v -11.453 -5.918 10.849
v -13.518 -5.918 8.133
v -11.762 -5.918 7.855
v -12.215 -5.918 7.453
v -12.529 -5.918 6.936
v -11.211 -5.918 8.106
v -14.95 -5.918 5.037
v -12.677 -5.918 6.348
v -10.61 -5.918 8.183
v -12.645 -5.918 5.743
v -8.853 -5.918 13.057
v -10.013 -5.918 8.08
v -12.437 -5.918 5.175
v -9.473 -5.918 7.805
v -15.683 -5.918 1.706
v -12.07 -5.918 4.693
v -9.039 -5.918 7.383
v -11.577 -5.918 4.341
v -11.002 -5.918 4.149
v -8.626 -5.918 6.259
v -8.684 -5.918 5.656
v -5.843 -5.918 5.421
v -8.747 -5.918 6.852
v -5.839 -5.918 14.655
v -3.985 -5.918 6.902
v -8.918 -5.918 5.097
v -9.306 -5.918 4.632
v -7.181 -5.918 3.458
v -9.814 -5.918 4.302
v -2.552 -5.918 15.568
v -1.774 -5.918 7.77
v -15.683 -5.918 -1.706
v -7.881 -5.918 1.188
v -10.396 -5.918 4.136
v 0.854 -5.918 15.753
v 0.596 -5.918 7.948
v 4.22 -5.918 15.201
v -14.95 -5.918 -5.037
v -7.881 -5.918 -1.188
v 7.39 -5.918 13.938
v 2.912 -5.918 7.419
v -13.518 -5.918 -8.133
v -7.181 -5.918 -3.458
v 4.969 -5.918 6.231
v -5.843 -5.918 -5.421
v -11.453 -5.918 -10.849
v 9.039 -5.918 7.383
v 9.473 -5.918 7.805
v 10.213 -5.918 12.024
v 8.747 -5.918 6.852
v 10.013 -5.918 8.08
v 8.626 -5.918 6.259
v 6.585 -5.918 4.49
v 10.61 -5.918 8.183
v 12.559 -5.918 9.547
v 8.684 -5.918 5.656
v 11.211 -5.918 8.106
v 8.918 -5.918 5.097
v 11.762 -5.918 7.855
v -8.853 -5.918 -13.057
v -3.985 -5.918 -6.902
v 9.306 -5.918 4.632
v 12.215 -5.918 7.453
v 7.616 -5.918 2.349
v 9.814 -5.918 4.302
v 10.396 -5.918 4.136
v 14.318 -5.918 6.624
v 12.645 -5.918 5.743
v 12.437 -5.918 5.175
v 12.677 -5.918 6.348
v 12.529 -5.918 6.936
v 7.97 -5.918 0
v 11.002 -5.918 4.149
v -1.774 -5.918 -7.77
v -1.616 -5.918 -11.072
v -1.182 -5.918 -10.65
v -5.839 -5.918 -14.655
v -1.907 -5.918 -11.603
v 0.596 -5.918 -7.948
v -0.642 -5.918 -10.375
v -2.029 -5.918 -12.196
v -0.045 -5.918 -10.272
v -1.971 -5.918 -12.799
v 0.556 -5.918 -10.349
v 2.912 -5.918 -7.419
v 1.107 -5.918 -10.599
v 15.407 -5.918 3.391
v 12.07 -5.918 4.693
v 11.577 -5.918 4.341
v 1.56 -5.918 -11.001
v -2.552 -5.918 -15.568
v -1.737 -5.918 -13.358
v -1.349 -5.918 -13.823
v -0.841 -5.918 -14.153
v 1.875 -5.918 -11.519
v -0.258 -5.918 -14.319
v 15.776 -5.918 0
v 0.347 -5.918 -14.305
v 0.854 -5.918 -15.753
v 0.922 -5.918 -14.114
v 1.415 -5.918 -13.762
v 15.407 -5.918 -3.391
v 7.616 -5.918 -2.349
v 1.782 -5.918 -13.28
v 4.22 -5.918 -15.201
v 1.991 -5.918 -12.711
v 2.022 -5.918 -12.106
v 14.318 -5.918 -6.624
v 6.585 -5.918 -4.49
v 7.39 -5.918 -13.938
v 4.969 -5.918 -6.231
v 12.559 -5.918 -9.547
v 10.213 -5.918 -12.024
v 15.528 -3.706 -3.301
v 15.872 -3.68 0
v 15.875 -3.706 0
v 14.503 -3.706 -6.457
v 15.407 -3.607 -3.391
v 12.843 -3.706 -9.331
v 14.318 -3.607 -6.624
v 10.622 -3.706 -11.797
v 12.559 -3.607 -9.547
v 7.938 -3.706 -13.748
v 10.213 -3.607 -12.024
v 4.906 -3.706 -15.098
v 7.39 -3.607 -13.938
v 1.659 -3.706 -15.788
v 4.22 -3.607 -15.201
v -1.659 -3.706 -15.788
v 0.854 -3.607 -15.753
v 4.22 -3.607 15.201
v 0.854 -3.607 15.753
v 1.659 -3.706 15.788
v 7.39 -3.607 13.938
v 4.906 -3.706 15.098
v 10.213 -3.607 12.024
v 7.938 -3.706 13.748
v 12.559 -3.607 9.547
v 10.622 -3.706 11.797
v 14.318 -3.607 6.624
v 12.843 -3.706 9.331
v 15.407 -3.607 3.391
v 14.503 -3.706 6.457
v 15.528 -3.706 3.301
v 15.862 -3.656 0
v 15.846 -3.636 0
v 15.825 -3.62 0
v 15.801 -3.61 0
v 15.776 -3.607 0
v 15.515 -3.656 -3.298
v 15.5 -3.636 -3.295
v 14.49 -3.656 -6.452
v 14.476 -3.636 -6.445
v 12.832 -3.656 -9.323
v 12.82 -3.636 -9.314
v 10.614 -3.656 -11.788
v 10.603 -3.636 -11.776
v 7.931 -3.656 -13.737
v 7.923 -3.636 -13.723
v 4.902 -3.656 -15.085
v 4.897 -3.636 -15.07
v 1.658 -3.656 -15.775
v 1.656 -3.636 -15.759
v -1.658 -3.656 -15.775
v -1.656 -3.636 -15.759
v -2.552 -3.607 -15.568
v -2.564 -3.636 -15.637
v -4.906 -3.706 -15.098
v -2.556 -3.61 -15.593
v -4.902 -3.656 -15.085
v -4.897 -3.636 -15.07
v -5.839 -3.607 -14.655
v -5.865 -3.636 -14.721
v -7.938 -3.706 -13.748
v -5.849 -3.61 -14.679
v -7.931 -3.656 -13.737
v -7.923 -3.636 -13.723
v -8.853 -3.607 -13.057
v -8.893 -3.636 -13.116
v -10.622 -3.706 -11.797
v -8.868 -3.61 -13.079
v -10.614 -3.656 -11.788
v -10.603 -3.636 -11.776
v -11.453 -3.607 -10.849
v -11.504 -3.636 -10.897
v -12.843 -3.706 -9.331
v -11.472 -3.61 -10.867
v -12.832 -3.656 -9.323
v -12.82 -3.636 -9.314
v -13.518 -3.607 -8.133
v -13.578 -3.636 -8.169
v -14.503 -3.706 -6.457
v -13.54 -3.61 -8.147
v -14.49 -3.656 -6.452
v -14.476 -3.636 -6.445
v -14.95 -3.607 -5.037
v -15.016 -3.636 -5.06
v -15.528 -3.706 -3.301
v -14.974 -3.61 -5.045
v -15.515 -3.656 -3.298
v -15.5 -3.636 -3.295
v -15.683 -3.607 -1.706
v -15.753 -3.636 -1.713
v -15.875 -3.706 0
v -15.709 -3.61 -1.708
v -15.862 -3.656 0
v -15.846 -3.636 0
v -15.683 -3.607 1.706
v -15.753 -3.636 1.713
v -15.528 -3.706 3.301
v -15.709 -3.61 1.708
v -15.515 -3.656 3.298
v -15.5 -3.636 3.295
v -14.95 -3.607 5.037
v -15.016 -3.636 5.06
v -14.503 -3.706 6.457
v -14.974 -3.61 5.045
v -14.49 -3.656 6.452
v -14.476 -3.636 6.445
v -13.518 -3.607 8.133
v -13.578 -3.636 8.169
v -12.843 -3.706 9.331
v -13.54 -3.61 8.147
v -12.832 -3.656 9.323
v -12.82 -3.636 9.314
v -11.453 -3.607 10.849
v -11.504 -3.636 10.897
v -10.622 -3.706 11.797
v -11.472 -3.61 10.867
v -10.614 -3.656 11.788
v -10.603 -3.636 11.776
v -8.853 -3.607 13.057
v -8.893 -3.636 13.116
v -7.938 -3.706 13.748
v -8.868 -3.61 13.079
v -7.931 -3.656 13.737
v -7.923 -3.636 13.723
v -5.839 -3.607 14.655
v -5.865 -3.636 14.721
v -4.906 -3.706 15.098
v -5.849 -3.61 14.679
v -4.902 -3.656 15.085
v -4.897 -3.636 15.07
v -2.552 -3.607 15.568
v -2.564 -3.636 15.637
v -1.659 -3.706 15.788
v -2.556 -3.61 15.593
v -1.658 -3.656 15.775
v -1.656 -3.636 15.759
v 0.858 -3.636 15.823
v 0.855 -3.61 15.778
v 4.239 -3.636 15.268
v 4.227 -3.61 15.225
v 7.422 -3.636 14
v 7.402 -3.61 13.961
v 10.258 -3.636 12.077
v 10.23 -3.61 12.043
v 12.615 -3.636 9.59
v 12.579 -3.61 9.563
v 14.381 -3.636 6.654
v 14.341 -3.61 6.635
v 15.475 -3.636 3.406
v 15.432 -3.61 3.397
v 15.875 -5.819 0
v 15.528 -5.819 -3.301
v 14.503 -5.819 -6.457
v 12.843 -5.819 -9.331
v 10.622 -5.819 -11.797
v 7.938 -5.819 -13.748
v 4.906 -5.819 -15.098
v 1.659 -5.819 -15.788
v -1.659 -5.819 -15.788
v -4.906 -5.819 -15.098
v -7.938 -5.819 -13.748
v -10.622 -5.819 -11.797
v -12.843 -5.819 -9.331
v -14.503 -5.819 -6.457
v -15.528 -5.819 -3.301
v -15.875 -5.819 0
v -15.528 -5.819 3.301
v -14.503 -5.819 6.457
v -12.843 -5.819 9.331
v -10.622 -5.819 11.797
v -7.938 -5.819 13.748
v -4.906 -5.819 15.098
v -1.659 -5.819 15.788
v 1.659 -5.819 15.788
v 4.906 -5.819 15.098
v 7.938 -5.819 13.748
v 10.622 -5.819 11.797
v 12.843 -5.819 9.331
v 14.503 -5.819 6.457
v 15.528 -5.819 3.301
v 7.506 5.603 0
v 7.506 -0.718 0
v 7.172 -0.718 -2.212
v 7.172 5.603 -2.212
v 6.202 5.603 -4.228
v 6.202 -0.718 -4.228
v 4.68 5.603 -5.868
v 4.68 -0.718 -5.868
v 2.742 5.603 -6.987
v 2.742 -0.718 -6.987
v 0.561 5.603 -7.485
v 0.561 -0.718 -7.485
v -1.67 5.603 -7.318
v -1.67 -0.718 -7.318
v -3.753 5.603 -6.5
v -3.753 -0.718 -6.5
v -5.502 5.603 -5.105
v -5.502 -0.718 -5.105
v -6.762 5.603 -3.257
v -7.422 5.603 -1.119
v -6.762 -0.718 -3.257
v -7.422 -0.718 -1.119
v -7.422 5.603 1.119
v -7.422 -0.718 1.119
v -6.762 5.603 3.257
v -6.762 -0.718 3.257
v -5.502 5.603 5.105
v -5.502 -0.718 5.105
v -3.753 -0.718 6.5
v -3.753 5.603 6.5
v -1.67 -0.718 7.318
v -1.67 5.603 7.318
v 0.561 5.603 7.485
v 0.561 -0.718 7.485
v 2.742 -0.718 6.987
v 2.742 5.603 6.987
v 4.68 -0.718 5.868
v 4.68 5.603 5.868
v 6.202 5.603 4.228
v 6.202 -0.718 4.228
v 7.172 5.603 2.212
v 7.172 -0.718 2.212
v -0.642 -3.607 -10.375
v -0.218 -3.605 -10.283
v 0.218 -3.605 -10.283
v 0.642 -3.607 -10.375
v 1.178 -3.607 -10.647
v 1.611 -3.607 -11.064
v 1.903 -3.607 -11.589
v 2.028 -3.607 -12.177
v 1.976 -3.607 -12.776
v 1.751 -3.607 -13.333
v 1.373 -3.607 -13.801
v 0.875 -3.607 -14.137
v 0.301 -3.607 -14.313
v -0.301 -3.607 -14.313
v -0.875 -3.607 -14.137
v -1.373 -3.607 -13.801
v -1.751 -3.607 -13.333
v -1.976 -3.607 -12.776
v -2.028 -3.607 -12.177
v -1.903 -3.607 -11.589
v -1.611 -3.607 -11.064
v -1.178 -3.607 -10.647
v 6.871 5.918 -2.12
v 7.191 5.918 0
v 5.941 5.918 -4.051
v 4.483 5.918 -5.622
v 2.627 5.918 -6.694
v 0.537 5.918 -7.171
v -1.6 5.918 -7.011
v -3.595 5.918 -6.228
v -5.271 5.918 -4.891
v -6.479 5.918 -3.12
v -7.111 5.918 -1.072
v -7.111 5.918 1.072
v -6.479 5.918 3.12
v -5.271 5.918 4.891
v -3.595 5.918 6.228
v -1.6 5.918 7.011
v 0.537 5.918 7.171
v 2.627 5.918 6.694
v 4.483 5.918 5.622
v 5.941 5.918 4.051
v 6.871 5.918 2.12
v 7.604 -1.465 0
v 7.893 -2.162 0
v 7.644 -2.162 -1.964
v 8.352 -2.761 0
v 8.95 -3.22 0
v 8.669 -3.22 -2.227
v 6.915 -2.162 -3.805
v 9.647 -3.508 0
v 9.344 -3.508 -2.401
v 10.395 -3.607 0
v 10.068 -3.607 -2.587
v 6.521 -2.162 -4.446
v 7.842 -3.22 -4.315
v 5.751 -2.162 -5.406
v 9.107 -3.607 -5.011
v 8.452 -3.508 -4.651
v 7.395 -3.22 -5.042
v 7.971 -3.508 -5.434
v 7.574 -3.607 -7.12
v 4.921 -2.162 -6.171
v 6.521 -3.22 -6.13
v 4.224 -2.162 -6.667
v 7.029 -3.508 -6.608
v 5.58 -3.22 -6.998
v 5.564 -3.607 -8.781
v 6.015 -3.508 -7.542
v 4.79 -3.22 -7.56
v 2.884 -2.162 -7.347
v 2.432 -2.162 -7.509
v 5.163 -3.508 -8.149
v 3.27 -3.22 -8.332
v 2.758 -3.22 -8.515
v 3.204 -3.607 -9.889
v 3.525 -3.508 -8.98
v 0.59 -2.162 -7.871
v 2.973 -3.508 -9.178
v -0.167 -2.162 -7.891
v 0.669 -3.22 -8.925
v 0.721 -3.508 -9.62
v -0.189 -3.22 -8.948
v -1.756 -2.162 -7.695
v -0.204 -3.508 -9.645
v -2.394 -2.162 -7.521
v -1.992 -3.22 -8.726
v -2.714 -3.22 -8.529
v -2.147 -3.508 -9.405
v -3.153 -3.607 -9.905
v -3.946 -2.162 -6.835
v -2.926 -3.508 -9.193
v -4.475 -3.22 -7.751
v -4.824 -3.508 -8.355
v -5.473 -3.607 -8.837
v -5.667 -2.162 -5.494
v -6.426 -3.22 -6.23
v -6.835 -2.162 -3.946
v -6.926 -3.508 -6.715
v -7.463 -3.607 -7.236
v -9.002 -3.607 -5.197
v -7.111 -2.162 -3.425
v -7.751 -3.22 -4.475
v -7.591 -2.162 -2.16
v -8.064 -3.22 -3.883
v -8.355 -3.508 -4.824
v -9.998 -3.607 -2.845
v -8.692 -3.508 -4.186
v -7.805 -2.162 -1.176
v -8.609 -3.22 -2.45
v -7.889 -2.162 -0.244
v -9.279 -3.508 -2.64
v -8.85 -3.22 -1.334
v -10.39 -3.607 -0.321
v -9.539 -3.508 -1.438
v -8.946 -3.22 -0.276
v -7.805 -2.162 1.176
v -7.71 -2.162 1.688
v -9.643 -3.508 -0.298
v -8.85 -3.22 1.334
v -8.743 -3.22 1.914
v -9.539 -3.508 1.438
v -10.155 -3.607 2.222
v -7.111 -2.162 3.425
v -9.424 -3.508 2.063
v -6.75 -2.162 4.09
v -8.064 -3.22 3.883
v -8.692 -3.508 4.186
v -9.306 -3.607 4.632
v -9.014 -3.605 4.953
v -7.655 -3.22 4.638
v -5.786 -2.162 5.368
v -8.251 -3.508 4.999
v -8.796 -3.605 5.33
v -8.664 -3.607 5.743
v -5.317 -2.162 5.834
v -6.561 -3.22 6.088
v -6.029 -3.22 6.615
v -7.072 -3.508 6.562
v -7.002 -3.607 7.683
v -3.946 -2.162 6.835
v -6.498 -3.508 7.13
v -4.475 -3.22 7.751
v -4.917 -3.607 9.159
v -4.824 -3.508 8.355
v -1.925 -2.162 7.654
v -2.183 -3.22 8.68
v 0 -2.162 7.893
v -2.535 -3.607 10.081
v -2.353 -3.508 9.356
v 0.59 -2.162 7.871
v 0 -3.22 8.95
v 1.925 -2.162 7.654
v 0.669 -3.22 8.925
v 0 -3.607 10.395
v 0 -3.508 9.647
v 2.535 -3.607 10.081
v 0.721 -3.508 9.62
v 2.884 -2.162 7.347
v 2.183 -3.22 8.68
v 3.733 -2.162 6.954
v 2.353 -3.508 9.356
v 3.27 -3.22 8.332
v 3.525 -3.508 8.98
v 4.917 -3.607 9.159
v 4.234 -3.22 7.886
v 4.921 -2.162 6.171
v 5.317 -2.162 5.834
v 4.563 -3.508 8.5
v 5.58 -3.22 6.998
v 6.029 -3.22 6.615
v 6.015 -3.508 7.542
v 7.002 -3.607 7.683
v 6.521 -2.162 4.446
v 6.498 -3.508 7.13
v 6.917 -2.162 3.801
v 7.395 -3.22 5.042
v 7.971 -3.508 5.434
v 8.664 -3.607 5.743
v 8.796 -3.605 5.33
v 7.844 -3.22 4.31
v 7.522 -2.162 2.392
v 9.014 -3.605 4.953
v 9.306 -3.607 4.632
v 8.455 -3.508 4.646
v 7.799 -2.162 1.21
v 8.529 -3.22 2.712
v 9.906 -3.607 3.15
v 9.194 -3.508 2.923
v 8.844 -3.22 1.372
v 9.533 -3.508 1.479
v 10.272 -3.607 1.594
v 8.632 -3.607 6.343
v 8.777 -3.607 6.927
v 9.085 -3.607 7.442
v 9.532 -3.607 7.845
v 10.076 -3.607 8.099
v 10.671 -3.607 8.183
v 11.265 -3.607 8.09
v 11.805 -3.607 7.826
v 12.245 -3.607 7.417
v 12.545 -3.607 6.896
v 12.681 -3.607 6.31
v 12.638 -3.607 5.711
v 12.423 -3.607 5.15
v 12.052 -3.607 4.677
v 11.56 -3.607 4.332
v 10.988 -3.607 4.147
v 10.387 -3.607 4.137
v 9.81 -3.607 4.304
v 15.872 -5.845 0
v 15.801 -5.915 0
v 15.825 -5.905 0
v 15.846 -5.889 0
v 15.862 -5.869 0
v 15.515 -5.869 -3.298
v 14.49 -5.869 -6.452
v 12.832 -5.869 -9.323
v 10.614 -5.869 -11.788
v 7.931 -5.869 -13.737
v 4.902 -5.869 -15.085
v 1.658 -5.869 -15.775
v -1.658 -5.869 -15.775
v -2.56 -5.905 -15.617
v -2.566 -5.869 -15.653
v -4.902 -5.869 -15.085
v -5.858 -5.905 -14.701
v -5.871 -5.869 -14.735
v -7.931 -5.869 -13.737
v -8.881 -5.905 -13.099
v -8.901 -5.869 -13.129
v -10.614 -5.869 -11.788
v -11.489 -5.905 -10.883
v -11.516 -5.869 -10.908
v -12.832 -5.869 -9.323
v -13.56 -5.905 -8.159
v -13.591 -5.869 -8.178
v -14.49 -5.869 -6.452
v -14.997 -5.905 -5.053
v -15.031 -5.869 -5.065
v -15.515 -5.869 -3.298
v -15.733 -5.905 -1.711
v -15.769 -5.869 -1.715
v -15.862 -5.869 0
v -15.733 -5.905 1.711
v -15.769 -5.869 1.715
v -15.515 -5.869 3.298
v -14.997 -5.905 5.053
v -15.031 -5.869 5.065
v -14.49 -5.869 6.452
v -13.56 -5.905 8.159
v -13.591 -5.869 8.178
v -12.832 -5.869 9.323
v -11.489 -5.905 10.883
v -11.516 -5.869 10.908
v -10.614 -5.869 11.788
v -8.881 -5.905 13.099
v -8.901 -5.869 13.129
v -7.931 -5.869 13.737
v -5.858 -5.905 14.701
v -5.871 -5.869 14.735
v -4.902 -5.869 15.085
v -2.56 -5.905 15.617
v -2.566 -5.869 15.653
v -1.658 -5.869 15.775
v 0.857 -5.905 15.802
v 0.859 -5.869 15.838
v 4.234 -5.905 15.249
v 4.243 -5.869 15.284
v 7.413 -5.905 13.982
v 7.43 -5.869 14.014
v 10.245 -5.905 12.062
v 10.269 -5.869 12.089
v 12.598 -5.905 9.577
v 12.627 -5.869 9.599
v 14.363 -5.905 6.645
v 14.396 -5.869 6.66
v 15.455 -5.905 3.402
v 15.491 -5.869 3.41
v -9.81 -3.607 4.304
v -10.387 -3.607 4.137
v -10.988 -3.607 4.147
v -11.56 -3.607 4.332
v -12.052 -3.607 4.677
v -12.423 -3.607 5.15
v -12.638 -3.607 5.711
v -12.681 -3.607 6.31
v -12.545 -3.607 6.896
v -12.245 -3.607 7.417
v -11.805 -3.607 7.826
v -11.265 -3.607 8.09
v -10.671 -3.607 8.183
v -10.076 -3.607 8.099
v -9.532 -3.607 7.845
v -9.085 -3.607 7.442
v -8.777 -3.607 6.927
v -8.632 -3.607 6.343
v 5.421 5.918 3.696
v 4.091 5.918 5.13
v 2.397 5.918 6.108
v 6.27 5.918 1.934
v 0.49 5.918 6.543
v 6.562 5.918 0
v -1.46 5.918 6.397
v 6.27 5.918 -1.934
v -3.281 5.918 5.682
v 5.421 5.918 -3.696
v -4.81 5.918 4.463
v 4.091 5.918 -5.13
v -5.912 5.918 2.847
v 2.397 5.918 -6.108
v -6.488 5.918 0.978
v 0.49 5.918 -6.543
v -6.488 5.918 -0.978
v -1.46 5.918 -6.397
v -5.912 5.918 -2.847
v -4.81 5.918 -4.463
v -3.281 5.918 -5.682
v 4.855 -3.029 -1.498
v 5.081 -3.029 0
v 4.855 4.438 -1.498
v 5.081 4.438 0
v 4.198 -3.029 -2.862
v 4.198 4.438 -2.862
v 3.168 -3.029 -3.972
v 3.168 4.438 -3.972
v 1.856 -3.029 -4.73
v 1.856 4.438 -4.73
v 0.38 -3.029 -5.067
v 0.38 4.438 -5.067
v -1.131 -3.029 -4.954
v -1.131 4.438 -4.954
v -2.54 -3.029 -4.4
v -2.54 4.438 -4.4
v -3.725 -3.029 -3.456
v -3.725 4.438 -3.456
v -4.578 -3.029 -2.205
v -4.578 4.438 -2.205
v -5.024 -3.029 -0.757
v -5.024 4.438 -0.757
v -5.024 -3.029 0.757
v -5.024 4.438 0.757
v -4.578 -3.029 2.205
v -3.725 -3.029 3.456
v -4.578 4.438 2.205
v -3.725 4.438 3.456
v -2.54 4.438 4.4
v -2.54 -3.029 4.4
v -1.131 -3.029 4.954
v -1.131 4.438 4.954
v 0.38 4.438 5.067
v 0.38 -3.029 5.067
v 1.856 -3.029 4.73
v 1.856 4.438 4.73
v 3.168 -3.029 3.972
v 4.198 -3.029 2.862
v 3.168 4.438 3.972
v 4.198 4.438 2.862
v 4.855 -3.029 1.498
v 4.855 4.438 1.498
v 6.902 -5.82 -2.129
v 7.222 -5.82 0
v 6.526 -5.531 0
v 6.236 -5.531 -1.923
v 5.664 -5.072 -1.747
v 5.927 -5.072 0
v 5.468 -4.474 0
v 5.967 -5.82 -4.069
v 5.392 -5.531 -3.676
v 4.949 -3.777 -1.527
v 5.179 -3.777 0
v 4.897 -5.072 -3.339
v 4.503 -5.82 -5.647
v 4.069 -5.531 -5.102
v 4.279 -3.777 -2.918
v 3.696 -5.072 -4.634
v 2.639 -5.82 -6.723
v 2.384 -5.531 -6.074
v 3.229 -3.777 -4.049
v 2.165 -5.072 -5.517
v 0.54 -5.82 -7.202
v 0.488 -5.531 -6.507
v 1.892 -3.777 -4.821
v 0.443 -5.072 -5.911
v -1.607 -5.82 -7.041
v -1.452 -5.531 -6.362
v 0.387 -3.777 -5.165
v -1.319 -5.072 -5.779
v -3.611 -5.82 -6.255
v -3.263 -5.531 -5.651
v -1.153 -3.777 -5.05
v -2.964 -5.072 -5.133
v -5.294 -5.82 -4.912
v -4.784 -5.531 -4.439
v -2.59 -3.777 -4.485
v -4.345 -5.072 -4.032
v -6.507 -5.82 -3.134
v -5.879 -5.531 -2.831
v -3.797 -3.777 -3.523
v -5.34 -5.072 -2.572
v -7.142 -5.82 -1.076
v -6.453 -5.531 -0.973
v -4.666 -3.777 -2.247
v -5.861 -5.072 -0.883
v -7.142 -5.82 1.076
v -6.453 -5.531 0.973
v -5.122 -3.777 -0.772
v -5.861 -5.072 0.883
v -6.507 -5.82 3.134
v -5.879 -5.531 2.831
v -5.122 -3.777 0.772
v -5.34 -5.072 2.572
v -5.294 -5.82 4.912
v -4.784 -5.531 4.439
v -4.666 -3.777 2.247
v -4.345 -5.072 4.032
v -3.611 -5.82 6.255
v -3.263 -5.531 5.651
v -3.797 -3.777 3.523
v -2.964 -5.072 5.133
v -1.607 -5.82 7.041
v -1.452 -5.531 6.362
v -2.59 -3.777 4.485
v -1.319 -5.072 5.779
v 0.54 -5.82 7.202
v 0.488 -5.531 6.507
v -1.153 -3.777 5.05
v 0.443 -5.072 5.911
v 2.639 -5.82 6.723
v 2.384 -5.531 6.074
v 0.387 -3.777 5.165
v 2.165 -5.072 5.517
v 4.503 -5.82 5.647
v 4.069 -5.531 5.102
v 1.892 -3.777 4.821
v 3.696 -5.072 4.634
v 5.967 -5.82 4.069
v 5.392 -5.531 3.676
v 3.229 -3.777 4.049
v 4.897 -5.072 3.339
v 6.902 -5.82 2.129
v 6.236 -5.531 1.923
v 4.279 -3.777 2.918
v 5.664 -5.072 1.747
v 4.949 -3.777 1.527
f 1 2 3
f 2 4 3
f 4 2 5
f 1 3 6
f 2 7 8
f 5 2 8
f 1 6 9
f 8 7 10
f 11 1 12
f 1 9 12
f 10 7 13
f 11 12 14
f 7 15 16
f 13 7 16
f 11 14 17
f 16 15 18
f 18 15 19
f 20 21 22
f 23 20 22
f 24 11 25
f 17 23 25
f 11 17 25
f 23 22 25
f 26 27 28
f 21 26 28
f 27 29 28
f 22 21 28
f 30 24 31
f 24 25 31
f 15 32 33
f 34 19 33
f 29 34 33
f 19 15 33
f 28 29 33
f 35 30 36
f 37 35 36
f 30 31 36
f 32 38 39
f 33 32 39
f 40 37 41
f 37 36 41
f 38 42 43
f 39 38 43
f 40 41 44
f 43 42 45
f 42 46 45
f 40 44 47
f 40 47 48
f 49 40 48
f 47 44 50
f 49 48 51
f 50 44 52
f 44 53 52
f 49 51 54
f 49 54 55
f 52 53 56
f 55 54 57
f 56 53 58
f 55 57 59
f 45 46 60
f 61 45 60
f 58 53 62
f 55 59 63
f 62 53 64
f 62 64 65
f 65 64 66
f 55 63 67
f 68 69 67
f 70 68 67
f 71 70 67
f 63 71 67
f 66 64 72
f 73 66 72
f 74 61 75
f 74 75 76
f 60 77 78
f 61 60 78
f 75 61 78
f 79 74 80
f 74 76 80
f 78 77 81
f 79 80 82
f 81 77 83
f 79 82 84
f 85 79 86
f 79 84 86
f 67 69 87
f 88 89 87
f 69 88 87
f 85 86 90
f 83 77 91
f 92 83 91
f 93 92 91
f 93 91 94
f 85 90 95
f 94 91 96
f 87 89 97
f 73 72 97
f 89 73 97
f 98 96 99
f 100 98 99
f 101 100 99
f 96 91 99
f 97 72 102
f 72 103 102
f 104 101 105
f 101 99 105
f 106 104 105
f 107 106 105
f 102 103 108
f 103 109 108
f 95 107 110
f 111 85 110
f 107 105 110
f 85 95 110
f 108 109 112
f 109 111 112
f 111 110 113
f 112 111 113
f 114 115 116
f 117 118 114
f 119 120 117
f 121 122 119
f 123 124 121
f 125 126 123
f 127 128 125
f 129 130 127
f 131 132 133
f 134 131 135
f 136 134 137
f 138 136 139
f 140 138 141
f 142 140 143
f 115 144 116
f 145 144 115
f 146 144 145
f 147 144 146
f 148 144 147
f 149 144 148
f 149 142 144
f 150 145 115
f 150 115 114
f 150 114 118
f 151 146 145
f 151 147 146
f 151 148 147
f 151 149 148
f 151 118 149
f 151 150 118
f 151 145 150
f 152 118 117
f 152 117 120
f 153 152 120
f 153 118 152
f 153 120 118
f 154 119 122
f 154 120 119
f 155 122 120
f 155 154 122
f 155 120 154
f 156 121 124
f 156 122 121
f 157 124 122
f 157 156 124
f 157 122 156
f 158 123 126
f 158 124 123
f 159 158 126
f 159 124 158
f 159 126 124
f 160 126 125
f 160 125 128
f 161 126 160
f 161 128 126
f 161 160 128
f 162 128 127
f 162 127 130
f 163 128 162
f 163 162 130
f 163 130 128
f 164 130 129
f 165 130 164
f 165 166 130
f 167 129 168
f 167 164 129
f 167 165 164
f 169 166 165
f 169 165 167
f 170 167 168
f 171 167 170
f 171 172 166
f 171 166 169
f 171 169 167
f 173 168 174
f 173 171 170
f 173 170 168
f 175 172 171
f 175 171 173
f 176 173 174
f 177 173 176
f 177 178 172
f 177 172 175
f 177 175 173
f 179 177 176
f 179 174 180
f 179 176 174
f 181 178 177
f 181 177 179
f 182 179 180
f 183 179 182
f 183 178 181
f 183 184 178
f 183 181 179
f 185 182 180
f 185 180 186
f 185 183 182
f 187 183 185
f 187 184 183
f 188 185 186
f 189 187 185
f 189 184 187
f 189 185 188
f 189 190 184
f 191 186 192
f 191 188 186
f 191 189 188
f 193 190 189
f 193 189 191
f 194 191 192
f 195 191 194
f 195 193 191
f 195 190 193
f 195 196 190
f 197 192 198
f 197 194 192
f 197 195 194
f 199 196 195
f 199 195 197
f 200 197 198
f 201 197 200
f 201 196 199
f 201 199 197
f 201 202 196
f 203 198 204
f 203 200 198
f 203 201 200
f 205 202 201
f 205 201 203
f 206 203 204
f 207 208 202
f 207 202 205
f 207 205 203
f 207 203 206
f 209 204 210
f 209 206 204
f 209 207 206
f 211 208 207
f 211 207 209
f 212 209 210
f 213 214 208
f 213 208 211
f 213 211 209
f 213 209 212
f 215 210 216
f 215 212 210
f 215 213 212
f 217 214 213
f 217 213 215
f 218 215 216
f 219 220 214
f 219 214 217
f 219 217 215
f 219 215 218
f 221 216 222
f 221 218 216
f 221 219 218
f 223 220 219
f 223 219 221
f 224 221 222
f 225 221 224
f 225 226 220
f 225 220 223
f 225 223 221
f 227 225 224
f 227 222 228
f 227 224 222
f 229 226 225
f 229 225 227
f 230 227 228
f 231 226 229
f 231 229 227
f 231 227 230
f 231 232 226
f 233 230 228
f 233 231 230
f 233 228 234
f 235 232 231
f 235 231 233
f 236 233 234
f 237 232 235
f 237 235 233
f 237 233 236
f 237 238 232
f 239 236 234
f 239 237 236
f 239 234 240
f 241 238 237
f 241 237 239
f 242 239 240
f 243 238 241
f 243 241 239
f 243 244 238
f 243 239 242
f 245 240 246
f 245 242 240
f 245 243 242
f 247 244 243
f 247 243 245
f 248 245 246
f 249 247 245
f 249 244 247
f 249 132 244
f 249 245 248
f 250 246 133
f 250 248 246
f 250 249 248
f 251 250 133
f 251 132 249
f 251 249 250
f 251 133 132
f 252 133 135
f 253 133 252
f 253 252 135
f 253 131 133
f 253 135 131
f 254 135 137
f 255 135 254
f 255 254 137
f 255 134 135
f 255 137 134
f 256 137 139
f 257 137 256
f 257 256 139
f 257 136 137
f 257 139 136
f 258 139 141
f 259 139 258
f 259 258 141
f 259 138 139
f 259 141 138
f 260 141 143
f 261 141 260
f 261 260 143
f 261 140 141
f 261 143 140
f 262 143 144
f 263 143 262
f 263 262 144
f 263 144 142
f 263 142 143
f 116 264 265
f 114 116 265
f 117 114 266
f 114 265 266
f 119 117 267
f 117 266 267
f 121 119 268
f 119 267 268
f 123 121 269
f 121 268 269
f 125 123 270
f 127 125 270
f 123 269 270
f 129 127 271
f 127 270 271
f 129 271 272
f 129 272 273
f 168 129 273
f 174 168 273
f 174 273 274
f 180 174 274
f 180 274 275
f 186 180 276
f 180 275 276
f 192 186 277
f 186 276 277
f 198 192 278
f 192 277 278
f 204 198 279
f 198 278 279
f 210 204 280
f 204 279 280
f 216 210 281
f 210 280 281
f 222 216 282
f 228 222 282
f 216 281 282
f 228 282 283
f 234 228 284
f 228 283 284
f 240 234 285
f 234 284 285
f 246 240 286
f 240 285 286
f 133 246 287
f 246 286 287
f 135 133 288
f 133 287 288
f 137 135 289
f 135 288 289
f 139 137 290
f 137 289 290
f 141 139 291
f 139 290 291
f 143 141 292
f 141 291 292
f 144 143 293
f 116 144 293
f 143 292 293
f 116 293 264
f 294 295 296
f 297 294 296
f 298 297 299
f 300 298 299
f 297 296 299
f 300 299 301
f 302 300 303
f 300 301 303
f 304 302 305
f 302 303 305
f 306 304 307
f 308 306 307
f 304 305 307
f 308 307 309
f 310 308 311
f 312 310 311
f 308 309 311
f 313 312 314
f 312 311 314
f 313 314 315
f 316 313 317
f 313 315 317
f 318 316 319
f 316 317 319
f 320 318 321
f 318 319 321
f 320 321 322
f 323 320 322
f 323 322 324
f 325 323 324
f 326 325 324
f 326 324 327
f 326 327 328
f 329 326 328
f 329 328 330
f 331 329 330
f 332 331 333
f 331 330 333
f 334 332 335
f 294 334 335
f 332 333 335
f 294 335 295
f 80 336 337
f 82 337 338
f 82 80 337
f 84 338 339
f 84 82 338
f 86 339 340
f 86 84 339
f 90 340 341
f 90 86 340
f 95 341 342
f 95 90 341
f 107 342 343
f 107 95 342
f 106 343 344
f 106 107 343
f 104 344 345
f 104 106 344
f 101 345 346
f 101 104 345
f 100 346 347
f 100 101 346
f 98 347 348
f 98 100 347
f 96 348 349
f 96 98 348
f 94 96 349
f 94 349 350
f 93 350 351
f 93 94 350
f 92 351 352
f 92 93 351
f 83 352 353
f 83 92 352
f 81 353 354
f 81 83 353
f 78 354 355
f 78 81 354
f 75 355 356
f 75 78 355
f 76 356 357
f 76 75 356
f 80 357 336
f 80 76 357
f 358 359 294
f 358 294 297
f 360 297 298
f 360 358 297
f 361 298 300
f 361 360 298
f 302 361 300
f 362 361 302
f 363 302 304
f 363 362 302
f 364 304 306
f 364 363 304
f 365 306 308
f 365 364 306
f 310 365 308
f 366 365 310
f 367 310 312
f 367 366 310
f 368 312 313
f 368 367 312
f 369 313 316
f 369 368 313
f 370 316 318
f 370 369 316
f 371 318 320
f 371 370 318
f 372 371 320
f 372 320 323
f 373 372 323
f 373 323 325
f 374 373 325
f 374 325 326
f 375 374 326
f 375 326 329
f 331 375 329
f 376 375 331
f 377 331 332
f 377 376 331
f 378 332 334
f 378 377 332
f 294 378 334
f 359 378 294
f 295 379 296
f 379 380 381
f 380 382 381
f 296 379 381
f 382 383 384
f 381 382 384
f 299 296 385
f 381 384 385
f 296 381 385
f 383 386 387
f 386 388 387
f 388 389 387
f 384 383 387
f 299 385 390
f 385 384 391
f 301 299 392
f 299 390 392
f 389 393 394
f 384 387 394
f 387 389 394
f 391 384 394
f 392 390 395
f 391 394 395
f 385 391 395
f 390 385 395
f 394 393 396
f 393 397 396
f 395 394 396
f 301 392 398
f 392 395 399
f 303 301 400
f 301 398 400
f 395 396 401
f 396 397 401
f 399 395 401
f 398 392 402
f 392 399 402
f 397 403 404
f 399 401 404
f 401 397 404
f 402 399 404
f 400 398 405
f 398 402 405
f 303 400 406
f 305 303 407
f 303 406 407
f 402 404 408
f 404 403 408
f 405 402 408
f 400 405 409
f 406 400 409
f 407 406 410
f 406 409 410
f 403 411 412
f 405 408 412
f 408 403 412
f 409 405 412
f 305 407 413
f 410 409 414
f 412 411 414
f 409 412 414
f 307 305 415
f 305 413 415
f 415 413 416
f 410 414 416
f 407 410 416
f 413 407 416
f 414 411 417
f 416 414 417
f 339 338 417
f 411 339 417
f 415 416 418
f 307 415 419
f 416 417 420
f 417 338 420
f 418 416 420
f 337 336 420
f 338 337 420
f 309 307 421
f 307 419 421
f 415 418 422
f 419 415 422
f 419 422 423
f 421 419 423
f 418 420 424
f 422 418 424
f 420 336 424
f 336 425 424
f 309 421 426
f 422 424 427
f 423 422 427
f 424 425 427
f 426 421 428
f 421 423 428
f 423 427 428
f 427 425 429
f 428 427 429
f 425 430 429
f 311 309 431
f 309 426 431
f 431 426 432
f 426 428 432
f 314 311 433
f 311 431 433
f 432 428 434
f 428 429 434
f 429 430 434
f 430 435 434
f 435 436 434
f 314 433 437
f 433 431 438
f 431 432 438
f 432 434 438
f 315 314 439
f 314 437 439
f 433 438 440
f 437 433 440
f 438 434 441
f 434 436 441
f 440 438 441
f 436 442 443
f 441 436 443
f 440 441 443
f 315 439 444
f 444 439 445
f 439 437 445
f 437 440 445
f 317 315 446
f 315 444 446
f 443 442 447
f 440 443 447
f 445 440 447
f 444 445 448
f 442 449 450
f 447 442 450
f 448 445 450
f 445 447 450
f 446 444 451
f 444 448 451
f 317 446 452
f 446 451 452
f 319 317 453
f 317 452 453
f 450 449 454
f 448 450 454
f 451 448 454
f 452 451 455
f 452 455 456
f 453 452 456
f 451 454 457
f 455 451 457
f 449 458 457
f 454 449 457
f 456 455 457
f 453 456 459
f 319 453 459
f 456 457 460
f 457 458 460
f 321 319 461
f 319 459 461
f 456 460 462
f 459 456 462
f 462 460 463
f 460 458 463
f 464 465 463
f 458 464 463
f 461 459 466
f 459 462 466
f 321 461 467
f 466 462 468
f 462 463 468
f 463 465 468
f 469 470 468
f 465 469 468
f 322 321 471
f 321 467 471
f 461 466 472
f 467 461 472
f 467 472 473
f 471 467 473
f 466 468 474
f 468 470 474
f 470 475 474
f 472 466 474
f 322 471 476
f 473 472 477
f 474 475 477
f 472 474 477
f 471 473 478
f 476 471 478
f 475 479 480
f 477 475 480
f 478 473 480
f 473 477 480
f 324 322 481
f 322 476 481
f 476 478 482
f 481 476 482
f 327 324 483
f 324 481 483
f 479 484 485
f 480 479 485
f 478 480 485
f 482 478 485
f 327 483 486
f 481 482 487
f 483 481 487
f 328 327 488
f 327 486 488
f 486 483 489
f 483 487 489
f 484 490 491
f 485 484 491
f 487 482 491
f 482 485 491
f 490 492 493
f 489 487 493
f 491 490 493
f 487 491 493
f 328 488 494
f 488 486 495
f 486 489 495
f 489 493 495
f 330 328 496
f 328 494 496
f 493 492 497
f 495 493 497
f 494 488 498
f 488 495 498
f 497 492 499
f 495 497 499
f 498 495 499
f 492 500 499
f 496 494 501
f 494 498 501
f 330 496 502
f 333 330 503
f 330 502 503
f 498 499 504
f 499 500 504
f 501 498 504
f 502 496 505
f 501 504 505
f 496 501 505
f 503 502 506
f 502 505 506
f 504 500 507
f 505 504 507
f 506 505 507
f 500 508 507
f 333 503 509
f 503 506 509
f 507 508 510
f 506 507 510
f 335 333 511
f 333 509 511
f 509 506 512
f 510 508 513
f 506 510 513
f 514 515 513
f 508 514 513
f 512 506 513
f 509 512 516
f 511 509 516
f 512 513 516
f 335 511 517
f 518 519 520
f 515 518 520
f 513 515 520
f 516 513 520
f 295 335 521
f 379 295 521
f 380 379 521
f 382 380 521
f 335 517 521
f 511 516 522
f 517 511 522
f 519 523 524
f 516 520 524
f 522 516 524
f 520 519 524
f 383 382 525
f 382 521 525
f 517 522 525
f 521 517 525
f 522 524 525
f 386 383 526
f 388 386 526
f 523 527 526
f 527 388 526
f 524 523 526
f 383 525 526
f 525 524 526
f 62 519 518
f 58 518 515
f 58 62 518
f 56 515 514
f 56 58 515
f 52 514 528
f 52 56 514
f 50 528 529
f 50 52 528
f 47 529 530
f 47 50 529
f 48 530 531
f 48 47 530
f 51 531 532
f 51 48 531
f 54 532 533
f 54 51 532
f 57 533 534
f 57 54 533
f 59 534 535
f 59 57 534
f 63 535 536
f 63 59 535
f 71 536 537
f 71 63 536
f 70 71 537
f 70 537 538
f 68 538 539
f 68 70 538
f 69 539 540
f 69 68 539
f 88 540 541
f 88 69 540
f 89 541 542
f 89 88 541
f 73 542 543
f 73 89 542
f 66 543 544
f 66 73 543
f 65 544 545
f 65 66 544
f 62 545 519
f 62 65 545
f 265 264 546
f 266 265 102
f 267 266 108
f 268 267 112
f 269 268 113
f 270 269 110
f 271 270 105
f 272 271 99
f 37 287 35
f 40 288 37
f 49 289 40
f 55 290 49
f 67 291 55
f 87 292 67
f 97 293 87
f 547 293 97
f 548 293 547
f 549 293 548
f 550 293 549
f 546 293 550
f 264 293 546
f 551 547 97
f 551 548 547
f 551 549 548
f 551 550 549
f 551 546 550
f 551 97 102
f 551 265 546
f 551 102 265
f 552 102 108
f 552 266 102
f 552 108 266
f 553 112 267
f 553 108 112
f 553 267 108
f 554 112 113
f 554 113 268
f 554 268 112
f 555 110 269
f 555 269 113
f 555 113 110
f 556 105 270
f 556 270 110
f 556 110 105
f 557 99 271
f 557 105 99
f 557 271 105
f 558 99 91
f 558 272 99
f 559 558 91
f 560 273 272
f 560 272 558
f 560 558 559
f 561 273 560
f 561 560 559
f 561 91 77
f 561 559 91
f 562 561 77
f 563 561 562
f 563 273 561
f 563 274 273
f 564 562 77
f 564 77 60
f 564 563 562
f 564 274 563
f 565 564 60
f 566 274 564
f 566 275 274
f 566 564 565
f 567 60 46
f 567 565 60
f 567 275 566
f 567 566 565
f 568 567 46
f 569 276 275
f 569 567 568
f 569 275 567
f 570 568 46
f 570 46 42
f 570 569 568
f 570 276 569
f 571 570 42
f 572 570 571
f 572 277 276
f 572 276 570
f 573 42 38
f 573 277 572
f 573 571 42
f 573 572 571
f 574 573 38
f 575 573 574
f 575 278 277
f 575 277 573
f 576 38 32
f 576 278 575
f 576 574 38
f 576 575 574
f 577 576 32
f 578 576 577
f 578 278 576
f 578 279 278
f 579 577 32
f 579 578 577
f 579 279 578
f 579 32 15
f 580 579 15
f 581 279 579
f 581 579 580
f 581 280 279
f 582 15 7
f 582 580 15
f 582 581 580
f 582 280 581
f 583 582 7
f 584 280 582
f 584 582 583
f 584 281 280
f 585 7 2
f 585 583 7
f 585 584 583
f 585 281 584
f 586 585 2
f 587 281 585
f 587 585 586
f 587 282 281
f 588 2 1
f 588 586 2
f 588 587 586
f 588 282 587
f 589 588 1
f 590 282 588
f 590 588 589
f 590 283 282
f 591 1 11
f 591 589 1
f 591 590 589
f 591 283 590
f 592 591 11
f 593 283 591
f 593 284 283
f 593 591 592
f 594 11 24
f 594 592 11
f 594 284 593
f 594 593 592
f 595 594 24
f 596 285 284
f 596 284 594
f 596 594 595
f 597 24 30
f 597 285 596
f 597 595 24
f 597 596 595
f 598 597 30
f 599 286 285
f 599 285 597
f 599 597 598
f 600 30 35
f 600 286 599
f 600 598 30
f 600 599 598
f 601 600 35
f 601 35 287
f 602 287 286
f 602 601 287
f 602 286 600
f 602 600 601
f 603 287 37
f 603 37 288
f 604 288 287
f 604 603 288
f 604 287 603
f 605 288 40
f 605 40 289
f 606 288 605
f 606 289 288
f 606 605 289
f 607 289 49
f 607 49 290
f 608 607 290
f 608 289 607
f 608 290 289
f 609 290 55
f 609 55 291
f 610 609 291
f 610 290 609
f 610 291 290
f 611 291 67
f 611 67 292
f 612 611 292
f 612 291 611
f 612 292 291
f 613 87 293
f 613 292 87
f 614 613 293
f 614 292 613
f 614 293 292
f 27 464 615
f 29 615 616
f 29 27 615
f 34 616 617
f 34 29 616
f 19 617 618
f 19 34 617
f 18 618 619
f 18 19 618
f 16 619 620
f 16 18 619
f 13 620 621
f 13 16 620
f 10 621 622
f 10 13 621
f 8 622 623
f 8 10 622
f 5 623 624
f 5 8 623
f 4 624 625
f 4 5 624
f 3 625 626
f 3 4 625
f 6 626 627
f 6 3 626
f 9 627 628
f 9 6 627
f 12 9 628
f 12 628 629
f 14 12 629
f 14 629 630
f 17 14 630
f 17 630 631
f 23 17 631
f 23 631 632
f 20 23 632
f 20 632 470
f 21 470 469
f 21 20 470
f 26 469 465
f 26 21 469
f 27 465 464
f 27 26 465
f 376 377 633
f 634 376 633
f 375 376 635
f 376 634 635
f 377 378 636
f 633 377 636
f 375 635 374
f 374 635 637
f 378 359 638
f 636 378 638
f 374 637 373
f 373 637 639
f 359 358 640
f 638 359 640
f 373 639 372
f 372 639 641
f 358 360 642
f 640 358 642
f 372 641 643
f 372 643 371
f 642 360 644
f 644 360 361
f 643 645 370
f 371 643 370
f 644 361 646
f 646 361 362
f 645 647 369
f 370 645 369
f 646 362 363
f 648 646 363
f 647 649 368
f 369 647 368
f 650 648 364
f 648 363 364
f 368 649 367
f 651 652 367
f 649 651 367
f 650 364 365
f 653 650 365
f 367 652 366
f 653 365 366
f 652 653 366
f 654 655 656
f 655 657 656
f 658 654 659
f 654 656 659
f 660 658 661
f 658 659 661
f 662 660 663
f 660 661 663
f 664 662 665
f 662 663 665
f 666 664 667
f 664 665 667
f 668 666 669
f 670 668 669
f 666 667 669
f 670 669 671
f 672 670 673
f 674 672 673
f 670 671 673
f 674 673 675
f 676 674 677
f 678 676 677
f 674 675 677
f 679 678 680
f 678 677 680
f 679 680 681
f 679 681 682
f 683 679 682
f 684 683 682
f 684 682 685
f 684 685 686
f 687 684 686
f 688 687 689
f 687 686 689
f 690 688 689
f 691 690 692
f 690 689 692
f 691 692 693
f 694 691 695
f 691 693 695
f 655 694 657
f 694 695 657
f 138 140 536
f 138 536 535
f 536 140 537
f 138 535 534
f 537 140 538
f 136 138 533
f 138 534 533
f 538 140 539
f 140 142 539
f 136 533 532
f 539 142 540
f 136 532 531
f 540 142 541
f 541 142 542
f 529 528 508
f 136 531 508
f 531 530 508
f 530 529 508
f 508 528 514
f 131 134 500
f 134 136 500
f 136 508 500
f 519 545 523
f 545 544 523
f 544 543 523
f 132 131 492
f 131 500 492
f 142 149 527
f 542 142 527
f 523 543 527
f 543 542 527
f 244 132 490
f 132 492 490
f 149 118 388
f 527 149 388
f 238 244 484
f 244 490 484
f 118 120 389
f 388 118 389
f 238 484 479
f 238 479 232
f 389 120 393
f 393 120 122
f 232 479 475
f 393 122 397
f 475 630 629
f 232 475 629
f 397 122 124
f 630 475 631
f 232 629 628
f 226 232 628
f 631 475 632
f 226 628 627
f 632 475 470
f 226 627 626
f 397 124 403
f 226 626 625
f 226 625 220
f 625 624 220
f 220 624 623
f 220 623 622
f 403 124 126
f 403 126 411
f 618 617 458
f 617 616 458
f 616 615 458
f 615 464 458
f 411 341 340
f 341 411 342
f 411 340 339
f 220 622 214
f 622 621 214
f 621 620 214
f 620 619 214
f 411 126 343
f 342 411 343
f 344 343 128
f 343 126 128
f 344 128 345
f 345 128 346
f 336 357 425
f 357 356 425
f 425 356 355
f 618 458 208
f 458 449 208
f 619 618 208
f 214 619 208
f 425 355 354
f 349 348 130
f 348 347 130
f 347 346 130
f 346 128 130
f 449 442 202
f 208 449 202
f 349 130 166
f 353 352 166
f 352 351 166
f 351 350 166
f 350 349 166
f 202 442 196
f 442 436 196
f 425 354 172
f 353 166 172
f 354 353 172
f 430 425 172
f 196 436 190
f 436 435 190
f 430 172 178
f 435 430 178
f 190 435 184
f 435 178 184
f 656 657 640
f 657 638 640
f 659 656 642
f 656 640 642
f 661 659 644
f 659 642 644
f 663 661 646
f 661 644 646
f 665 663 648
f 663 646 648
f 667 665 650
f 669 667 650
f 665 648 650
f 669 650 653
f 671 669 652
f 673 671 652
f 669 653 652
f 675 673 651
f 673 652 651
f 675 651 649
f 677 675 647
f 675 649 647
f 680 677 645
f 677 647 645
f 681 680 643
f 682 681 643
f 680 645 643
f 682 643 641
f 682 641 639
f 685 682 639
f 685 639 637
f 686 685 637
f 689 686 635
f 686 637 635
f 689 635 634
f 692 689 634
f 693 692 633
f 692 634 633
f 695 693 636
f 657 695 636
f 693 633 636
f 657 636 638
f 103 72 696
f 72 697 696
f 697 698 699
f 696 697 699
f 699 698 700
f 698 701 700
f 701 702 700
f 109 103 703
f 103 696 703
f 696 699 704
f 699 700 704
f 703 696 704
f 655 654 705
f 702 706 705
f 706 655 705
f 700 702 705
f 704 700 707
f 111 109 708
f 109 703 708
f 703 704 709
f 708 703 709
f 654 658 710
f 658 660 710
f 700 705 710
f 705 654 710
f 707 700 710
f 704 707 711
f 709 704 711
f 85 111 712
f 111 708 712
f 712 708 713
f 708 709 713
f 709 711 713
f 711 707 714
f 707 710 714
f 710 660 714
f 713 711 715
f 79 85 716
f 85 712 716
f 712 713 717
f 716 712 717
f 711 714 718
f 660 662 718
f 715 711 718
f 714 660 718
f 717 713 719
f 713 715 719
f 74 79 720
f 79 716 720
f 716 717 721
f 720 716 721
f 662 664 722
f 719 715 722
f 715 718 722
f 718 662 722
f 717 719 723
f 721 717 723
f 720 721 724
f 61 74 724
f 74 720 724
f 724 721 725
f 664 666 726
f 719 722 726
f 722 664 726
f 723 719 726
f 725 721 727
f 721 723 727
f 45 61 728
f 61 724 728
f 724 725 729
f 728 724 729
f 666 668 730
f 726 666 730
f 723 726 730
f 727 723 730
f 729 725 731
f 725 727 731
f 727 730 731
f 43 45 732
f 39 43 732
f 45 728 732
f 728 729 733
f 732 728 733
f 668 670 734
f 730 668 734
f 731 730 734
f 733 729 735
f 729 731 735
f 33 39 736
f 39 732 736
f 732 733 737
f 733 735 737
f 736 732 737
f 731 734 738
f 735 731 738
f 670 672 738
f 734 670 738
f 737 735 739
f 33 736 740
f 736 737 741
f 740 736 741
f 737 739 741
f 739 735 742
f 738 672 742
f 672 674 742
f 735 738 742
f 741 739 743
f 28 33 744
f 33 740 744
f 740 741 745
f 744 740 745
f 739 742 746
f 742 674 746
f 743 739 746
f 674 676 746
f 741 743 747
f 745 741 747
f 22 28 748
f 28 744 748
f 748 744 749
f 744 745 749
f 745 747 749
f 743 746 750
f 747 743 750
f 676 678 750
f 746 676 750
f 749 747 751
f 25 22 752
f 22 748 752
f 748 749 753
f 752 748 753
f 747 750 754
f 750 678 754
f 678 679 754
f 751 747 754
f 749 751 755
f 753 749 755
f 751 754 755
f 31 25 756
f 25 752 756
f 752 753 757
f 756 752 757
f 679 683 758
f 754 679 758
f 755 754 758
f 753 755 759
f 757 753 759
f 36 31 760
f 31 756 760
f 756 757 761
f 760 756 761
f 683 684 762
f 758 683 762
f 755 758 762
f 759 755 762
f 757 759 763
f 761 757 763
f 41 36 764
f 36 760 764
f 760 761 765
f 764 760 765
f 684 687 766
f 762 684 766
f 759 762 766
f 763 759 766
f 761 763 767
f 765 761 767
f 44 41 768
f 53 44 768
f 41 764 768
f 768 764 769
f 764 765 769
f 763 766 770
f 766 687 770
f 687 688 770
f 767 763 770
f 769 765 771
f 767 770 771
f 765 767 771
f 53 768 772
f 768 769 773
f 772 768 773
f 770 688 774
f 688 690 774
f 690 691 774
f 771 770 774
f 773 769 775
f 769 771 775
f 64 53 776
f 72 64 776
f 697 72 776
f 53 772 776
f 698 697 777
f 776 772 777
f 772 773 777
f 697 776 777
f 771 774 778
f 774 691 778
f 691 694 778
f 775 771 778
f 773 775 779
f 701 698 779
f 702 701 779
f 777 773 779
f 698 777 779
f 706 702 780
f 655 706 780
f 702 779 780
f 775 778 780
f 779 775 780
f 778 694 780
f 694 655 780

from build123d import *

# Parameters (mm, degrees)
CUT_EXTRUDE1_DEPTH      = 24.217586921
CUT_EXTRUDE1_DEPTH_BACK = 24.217586921
SKETCH4_R               = 2.032
FILLET1_R               = 0.09921875
CHAMFER1_SIZE           = 0.314729983


with BuildPart() as part:
    # Sketch3 → Revolve1 (revolve)
    with BuildSketch(Plane.XY):
        with BuildLine():
            Line((-5.080939697, -3.02895), (-5.080939697, 4.437629646))
            Line((-5.080939697, 4.437629646), (-6.561510051, 5.9182))
            Line((-6.561510051, 5.9182), (-7.5057, 5.9182))
            Line((-7.5057, 5.9182), (-7.5057, -0.71755))
            ThreePointArc((-7.5057, -0.71755), (-8.351941732, -2.760558268), (-10.39495, -3.6068))
            Line((-10.39495, -3.6068), (-15.875, -3.6068))
            Line((-15.875, -3.6068), (-15.875, -5.9182))
            Line((-15.875, -5.9182), (-7.970189697, -5.9182))
            ThreePointArc((-7.970189697, -5.9182), (-5.927181429, -5.071958268), (-5.080939697, -3.02895))
        make_face()
    revolve(axis=Axis((0, -5.9182, 0), (0, 1, 0)))

    # Sketch4 → Cut-Extrude1 (cut, two sides: drawn at the far end of the back side and taken through both)
    with BuildSketch(Plane(origin=(0, 0, 0), x_dir=(1, 0, 0), z_dir=(0, 1, 0)).offset(-CUT_EXTRUDE1_DEPTH_BACK)):
        with Locations((0, 12.303125)):
            Circle(SKETCH4_R)
        with Locations((10.654818796, -6.1515625)):
            Circle(SKETCH4_R)
        with Locations((-10.654818796, -6.1515625)):
            Circle(SKETCH4_R)
    extrude(amount=CUT_EXTRUDE1_DEPTH + CUT_EXTRUDE1_DEPTH_BACK, mode=Mode.SUBTRACT)

    # Fillet1
    fillet1_edges = [part.edges().sort_by_distance(p)[0] for p in [
        (15.875, -3.6068, 0),
        (15.875, -5.9182, 0),
    ]]
    fillet(fillet1_edges, radius=FILLET1_R)

    # Chamfer1
    chamfer1_edges = [part.edges().sort_by_distance(p)[0] for p in [
        (7.5057, 5.9182, 0),
    ]]
    chamfer(chamfer1_edges, length=CHAMFER1_SIZE)


solid = part.part
